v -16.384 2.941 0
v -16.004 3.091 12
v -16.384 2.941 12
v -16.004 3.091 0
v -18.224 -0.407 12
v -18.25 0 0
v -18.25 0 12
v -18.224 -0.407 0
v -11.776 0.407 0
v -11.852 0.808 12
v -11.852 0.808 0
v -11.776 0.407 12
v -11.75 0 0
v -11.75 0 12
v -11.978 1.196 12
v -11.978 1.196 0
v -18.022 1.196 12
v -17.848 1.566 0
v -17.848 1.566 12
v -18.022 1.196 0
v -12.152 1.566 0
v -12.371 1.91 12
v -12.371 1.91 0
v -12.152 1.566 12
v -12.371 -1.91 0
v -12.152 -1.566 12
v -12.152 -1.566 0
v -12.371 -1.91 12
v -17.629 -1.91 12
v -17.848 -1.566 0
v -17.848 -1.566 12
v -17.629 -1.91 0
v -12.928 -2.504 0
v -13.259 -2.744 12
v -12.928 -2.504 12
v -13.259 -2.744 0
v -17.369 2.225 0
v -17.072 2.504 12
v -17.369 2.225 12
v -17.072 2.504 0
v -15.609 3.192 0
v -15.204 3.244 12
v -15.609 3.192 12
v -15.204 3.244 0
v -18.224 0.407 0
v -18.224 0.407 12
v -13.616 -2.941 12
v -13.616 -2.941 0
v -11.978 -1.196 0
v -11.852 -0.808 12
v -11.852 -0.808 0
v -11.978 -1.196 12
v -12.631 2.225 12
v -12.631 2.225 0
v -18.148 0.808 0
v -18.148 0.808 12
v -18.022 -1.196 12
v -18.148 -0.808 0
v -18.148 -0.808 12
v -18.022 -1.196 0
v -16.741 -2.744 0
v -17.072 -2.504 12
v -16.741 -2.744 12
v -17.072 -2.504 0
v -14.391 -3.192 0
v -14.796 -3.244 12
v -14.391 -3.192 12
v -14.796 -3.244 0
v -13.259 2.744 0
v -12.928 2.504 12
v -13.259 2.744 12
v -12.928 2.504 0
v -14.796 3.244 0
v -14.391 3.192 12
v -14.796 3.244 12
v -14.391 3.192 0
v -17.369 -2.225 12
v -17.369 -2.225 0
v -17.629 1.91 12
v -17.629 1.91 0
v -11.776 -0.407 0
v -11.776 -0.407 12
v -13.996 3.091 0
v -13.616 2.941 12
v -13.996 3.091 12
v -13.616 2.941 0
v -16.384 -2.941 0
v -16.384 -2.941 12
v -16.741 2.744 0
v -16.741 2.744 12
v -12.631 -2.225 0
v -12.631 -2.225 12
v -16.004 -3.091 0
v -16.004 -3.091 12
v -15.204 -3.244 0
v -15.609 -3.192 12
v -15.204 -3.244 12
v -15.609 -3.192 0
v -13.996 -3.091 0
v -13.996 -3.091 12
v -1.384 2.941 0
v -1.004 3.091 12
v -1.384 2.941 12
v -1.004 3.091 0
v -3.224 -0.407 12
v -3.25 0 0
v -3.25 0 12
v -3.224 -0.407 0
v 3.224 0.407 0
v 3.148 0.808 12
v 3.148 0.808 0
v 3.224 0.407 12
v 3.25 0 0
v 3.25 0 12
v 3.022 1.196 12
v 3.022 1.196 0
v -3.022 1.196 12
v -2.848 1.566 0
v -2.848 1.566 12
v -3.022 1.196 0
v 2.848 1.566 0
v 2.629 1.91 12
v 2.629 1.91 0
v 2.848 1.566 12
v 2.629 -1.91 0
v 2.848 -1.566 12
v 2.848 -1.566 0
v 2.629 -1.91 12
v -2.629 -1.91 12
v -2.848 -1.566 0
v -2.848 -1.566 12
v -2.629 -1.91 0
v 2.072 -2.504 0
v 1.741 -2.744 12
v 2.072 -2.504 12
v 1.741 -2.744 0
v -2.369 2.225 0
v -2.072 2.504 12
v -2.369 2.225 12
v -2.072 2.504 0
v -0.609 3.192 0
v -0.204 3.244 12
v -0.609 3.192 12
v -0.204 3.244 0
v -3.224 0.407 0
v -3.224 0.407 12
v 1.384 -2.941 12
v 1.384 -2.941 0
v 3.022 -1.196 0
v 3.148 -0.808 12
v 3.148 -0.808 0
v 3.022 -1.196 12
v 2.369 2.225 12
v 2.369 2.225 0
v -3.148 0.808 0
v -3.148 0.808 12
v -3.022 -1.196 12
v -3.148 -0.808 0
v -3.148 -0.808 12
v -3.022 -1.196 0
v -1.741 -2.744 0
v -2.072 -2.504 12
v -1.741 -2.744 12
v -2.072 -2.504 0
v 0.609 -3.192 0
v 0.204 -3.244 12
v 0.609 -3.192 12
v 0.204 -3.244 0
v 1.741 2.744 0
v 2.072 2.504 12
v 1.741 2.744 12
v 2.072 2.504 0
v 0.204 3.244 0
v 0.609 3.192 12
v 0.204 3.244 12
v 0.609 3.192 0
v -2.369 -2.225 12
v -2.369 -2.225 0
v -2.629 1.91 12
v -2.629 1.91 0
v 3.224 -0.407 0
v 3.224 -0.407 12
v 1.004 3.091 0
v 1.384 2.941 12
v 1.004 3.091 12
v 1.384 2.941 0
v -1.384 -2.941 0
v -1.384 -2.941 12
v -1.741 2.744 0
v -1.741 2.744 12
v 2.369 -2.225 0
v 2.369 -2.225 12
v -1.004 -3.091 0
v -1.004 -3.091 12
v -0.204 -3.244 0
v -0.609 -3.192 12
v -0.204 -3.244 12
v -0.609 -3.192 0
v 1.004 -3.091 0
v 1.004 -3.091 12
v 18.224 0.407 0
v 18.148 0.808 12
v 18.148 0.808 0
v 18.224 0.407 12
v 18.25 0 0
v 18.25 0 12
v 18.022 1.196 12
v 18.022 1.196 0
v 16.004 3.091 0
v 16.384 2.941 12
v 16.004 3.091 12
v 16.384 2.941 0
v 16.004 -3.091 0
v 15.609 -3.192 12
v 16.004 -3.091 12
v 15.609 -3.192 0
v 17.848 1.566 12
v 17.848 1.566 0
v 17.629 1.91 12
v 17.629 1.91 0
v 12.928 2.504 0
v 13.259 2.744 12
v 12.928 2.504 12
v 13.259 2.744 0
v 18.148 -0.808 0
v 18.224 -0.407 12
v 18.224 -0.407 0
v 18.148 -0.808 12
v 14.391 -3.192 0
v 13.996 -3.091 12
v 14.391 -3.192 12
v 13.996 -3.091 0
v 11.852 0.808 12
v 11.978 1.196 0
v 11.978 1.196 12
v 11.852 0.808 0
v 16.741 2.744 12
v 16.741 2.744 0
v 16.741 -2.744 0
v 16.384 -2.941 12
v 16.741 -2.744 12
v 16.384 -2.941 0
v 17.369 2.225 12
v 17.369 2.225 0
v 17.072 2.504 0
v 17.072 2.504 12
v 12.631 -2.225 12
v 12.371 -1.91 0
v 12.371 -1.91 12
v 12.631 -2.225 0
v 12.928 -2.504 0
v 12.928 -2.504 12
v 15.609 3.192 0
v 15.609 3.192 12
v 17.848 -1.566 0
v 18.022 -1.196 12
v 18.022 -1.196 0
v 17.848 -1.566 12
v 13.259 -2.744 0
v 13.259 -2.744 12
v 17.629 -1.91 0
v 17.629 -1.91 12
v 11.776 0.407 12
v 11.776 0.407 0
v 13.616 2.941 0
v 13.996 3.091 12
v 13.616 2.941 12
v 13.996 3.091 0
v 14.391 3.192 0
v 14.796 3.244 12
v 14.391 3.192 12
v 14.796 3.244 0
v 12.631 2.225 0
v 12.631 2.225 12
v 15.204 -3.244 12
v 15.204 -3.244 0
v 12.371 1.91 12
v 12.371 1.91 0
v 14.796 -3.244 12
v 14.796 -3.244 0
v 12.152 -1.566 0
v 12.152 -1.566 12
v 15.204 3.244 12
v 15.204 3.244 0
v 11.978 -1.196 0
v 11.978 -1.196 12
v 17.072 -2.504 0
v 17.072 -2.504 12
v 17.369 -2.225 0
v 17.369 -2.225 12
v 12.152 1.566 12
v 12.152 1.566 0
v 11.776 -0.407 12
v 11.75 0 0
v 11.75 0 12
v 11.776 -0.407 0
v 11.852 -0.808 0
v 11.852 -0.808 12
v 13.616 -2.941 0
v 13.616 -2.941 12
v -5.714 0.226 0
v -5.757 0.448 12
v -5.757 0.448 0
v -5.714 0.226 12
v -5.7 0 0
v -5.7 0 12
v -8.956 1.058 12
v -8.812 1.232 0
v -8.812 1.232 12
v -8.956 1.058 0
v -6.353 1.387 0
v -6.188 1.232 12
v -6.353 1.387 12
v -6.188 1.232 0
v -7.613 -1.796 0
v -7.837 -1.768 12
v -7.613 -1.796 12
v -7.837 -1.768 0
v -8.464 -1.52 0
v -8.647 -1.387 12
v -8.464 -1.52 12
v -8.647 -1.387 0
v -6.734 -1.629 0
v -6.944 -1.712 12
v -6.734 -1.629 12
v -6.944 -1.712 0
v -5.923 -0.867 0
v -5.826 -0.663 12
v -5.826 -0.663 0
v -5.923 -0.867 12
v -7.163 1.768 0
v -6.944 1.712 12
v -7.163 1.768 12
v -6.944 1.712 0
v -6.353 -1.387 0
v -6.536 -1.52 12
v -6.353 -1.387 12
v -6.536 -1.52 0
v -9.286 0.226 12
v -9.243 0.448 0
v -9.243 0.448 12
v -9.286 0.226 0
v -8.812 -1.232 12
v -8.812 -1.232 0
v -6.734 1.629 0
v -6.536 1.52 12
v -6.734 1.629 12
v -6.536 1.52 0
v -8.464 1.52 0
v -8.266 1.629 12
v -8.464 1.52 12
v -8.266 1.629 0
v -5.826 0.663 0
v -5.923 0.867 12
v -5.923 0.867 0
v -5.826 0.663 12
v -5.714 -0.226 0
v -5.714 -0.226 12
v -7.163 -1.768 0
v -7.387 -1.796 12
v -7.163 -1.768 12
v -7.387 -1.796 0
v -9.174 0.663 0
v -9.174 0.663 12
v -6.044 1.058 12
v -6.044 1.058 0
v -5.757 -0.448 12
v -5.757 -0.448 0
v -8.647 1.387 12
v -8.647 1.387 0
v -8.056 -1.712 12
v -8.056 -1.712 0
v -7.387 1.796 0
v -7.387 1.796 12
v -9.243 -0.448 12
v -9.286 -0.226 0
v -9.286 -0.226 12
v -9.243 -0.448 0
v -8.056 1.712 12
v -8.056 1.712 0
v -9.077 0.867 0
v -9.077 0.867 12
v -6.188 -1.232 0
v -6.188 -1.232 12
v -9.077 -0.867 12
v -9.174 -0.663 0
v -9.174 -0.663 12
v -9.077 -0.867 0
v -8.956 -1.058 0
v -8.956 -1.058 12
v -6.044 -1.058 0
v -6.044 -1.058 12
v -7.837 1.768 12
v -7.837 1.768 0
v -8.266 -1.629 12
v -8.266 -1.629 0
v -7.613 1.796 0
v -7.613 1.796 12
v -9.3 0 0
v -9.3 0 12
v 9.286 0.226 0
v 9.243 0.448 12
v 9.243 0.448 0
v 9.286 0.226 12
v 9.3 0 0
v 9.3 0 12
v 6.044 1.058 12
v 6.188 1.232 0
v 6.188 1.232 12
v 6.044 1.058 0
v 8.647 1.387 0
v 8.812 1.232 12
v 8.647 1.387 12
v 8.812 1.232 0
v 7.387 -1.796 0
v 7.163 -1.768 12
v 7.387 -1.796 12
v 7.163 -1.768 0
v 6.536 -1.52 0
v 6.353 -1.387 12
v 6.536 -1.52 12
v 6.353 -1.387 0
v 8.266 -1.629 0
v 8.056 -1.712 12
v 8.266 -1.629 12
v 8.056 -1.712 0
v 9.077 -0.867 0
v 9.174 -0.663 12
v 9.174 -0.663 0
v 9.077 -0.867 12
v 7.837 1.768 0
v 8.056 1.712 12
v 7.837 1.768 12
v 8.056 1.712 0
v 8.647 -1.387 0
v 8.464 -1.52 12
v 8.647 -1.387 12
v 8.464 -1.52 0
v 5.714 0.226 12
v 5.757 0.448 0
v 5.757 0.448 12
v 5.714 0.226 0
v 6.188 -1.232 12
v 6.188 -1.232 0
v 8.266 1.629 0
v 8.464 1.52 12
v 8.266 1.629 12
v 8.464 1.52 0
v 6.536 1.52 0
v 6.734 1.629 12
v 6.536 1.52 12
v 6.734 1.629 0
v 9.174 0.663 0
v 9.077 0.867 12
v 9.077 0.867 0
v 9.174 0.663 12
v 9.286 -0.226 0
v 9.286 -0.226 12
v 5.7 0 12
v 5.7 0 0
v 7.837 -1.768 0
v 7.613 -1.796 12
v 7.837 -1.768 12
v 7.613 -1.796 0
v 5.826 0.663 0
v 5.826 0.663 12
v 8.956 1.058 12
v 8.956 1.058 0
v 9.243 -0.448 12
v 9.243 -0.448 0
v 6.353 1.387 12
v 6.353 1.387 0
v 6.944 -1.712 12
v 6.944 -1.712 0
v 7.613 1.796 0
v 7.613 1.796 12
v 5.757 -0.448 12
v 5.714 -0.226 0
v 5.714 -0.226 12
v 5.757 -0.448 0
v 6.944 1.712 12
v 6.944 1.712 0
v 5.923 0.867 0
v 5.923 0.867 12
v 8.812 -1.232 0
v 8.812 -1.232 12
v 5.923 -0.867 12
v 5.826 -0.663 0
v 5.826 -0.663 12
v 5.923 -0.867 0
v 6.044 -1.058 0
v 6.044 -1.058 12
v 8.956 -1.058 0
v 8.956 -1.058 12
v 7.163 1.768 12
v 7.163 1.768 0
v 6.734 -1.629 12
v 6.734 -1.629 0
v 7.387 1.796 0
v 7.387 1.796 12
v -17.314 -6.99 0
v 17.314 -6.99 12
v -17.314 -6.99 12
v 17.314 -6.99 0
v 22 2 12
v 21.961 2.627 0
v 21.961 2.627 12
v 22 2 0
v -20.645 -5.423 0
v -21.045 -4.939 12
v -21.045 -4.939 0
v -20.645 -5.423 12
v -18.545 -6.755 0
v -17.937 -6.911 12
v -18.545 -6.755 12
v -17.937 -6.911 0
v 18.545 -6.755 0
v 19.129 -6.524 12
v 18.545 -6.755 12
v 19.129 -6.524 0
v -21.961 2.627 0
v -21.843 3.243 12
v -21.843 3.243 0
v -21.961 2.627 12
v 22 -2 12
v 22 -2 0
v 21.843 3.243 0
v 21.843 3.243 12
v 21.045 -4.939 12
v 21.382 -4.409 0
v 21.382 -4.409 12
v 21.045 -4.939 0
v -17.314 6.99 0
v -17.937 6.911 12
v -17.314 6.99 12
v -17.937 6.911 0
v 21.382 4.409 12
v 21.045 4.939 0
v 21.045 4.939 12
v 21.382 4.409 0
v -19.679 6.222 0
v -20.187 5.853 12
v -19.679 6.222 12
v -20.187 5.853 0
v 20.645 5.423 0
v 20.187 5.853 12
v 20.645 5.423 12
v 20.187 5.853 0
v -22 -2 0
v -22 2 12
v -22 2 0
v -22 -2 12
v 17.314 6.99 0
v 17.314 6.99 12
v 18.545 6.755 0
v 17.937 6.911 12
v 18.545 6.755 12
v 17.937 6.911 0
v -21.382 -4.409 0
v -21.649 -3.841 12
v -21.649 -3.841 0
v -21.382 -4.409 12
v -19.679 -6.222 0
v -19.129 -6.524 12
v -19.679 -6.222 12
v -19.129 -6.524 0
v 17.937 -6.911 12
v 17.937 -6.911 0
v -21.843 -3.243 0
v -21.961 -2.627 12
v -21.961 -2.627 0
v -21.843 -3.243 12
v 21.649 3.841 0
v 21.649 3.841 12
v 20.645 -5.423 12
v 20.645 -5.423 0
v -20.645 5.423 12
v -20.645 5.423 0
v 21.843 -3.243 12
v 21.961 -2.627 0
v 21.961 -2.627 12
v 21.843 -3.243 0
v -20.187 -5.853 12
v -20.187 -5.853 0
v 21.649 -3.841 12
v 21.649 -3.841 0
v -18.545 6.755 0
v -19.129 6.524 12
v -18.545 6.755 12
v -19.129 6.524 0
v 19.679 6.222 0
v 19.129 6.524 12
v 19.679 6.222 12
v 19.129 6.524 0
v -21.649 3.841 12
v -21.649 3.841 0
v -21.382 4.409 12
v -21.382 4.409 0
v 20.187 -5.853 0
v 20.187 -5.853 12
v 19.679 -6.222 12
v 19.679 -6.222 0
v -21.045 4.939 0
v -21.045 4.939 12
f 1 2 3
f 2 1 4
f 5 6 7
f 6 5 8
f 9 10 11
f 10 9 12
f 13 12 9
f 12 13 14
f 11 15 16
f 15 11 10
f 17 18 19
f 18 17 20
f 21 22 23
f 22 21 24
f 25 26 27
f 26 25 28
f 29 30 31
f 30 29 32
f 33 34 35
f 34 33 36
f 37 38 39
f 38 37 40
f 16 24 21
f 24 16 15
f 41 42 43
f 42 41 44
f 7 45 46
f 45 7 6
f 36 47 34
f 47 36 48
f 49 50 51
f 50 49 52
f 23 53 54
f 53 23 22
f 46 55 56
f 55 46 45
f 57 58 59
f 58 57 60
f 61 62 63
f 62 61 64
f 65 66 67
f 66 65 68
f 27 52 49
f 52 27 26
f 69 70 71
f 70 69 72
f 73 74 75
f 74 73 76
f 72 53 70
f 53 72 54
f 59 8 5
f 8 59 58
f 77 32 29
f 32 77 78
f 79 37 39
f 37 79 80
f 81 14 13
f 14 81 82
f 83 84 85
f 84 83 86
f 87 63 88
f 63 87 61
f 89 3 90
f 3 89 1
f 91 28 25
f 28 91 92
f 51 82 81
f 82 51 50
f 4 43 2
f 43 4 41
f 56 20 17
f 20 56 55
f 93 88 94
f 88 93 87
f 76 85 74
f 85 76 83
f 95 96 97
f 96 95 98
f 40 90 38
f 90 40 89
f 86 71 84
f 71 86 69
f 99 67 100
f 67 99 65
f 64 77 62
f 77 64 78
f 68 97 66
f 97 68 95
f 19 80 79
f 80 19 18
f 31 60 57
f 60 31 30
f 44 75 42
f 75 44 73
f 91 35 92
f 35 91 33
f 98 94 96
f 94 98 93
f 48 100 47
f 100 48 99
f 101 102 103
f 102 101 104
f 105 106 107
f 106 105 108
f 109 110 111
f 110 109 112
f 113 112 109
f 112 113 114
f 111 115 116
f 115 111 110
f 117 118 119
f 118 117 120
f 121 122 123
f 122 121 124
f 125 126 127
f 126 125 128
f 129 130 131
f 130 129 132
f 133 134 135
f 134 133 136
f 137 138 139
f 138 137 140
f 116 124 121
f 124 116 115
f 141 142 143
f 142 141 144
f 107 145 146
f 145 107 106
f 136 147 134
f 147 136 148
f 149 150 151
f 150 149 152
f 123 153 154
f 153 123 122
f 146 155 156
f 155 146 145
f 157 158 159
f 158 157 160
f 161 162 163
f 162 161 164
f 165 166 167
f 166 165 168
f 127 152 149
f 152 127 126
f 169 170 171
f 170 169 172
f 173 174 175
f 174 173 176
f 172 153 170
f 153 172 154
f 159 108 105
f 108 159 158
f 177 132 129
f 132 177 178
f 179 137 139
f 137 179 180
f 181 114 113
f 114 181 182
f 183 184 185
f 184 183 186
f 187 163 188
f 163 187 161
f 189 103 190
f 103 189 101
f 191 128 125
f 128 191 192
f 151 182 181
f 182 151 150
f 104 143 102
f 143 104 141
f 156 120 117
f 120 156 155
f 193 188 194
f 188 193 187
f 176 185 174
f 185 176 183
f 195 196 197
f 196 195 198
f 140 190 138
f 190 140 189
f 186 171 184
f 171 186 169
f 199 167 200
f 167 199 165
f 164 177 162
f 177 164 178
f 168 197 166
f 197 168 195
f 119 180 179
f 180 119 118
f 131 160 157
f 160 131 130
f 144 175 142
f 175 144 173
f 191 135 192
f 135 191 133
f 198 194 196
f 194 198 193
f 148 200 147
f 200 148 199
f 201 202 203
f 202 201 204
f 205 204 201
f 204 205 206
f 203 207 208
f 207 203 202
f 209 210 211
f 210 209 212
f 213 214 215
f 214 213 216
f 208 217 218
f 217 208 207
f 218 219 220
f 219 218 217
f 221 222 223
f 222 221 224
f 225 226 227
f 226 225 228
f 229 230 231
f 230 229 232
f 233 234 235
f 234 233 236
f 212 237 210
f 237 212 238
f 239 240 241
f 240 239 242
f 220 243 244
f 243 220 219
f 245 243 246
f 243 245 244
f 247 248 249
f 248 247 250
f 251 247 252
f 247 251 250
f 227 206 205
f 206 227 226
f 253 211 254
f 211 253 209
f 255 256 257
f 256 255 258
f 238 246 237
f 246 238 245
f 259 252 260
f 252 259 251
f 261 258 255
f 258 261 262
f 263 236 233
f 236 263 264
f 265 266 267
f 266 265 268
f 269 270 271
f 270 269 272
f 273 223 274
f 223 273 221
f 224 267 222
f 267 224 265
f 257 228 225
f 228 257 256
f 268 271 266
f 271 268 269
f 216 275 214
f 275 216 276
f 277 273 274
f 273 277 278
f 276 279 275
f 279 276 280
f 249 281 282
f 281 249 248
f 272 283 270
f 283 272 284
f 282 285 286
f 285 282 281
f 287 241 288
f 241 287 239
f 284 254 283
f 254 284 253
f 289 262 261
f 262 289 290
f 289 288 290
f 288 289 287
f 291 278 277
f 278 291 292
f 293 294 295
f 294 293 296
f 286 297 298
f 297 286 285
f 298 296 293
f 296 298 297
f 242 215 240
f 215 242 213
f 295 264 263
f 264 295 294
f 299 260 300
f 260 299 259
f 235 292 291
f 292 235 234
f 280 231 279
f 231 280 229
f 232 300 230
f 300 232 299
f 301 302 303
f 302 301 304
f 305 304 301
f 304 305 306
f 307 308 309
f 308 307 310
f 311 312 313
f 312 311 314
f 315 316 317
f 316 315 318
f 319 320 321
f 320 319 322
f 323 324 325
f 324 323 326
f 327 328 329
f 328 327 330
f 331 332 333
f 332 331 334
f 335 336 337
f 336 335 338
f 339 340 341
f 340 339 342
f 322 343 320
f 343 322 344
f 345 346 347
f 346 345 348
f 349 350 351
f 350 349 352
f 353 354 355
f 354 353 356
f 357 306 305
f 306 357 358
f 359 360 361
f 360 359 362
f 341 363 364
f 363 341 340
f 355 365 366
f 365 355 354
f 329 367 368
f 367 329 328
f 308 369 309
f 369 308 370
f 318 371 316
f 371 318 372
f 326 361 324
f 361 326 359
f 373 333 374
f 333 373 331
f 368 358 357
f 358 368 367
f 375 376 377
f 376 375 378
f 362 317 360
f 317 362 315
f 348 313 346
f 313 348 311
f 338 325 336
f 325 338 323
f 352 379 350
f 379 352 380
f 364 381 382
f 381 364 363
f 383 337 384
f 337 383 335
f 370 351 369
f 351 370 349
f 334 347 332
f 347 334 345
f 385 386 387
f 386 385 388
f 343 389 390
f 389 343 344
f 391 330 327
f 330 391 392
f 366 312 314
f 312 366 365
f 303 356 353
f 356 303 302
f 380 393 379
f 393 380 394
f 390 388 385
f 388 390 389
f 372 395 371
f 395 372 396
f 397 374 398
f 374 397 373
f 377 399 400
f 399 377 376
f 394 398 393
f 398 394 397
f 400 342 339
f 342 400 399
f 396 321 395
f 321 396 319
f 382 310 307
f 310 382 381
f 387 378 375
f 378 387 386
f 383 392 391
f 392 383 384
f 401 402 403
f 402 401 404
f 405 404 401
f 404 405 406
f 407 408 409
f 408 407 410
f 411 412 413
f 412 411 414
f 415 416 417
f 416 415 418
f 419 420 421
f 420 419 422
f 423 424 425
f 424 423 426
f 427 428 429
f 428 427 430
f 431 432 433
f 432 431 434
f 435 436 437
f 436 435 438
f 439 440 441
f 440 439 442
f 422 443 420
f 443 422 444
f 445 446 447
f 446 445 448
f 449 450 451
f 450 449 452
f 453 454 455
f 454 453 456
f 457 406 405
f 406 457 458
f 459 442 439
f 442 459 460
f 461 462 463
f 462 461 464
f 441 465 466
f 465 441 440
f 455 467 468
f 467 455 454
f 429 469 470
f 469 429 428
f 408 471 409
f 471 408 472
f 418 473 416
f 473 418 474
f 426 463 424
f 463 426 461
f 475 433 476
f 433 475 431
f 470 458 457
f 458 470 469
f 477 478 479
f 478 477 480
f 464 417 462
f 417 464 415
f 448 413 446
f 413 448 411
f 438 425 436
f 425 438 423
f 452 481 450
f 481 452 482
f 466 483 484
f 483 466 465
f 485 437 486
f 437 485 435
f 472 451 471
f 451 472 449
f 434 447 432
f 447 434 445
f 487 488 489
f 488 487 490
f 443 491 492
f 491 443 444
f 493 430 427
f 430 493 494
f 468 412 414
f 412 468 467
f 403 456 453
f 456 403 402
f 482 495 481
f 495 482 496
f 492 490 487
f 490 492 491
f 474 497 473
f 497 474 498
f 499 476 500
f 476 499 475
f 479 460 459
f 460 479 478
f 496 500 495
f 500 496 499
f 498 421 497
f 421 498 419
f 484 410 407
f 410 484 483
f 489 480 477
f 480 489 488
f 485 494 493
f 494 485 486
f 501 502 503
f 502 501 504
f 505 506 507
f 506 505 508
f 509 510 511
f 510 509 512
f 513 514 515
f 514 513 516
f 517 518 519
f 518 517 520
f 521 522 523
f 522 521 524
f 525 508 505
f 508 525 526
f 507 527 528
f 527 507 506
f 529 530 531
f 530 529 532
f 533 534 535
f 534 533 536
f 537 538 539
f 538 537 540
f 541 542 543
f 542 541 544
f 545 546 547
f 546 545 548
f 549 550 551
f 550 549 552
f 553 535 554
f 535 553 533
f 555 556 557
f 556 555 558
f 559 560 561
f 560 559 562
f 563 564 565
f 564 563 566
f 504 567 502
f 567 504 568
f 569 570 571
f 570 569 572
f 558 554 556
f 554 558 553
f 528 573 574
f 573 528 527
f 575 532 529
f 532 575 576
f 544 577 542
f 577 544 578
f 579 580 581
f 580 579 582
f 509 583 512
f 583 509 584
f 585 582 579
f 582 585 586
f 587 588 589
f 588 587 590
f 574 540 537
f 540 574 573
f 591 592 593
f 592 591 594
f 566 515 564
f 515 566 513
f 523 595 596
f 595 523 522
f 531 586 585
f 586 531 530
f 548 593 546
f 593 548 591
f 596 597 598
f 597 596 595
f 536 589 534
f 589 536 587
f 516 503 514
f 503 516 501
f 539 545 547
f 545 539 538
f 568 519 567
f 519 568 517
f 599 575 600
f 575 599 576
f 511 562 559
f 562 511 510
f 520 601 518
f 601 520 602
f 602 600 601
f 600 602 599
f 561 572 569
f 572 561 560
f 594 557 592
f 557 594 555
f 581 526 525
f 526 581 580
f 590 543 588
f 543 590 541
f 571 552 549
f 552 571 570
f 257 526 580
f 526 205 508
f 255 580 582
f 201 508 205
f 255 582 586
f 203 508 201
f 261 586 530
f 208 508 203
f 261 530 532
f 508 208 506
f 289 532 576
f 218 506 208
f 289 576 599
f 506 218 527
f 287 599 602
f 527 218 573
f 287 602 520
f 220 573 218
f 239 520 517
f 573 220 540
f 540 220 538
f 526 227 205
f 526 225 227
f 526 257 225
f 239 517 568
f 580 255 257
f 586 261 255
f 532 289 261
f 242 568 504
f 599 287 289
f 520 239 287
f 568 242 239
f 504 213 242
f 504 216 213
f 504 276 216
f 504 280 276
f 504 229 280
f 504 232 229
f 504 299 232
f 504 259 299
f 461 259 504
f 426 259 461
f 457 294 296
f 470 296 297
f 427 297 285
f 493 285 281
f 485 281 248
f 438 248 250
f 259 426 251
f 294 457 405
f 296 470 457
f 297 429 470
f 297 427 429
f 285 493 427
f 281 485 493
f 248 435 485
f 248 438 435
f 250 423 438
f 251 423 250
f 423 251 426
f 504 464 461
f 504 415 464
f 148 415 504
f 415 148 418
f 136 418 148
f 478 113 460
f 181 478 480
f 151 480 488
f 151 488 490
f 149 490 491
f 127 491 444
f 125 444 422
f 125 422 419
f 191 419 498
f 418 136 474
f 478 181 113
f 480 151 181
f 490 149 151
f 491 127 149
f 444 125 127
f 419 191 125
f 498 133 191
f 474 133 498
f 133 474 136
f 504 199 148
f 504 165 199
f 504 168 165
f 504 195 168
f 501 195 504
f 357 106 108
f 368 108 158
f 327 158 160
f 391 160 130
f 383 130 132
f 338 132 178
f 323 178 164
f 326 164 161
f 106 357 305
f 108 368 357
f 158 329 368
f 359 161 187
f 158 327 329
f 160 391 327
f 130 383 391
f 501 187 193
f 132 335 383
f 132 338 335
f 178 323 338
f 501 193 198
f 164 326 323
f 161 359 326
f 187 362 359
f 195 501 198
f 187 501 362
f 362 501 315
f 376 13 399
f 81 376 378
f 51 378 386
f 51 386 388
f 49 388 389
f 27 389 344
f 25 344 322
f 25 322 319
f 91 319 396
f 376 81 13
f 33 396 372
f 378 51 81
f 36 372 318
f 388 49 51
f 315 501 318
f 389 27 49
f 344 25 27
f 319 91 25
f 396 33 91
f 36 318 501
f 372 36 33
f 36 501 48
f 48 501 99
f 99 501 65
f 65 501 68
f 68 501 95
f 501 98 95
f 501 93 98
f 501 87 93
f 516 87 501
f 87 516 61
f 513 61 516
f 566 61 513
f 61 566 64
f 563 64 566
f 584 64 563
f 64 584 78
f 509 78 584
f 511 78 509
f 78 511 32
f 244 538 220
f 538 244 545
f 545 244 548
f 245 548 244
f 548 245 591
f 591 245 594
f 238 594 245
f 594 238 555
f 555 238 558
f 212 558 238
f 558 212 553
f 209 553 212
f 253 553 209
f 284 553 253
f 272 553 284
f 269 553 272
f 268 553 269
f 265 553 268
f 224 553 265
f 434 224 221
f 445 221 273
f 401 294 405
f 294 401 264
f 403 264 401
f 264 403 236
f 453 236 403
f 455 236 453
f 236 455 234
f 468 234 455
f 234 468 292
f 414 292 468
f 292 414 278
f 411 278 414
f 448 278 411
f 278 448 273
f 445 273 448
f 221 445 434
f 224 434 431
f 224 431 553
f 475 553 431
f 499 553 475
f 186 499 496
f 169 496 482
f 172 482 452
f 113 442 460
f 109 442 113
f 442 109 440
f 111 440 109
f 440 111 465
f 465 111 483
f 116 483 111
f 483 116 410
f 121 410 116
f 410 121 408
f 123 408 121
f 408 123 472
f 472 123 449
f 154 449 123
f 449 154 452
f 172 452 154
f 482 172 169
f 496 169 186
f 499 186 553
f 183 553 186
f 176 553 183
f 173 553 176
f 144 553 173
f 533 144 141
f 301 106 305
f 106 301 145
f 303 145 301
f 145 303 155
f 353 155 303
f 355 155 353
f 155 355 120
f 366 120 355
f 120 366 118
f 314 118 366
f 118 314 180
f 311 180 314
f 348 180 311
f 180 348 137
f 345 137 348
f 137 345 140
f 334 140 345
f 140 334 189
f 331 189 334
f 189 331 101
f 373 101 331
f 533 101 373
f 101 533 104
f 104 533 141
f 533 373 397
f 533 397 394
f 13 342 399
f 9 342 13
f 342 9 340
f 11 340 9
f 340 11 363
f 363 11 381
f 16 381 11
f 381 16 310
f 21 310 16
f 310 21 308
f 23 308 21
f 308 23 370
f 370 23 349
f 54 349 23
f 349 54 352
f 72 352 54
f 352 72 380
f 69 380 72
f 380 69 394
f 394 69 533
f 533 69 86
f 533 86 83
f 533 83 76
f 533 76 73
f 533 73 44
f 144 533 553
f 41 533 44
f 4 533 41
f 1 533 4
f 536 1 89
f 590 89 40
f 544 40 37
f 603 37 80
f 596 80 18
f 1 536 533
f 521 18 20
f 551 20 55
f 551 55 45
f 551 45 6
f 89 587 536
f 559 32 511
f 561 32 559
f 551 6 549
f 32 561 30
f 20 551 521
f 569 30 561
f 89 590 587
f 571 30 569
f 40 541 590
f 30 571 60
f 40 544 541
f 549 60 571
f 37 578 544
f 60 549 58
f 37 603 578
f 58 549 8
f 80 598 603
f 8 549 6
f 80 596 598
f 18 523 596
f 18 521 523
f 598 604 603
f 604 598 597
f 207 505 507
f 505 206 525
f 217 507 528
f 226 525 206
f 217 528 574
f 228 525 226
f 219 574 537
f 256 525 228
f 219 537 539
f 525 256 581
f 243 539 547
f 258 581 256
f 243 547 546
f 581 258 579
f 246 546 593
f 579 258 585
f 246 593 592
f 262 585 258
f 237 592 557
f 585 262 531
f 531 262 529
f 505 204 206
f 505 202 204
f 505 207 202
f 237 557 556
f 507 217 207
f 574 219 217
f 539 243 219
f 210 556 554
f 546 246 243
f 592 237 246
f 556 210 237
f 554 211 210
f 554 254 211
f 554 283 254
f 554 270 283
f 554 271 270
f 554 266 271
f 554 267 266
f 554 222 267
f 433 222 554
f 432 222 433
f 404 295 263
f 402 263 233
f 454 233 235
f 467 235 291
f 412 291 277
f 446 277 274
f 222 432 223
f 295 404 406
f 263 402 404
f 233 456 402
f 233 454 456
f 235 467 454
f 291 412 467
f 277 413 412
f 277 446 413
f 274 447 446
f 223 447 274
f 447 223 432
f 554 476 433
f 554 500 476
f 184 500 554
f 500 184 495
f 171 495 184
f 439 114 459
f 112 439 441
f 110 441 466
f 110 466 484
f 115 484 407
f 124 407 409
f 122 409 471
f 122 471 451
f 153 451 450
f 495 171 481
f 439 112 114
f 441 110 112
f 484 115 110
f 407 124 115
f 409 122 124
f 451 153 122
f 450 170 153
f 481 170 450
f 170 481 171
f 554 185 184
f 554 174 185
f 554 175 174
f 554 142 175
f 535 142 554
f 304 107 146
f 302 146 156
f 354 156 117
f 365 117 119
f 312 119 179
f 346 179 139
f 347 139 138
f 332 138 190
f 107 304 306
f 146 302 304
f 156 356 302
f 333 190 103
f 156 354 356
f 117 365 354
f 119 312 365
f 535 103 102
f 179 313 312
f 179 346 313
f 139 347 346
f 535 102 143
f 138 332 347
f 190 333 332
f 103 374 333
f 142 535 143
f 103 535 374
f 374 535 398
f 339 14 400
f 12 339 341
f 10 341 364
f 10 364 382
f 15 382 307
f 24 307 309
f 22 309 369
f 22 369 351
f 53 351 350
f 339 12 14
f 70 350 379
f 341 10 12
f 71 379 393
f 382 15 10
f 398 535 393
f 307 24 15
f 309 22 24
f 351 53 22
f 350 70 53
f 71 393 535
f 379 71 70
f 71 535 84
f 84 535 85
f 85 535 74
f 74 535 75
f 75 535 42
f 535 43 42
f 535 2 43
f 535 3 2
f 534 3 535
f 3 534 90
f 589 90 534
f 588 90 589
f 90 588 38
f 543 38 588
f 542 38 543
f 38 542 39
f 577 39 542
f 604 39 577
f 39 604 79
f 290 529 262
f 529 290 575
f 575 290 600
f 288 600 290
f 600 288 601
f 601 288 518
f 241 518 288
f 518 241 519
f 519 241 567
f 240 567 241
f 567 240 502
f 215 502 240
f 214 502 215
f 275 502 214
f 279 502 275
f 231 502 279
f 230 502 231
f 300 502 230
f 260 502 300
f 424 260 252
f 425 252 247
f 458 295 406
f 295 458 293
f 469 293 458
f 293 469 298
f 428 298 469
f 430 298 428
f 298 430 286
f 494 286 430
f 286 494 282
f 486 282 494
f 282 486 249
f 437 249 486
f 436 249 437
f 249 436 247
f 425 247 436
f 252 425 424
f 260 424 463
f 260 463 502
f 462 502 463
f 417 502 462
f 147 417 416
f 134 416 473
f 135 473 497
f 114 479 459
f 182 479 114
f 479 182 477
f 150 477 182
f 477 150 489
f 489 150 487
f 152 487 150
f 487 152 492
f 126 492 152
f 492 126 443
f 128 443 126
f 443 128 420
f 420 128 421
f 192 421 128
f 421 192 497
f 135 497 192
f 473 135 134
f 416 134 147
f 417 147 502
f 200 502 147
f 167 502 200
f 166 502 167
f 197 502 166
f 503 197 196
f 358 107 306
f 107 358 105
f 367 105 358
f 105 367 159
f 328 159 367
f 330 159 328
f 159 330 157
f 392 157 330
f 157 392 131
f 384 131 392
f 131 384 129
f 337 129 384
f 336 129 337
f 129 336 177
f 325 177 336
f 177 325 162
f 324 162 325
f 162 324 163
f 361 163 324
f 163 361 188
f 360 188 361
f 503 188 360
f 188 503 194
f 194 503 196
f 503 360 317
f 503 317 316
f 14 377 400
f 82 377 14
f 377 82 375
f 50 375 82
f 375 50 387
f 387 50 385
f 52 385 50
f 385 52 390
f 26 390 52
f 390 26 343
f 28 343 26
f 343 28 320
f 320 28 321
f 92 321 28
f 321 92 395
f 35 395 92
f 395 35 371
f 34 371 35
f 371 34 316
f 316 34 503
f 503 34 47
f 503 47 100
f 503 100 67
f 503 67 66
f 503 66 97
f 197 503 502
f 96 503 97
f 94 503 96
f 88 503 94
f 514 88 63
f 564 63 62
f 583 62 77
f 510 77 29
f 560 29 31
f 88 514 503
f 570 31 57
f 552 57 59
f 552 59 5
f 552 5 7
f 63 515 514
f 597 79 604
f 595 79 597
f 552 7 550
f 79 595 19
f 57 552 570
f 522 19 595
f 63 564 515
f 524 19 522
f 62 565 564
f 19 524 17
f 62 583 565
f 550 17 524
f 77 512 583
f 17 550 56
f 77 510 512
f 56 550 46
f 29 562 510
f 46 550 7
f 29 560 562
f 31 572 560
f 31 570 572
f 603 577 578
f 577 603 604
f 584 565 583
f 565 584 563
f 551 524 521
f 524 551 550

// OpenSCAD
$fn = 50;


difference() {
	union() {
		*color(alpha = 1.0000000000, c = "gray") {
			translate(v = [0, 7, 0]) {
				linear_extrude(height = 1) {
					text(font = "Arial:style=Bold", halign = "center", size = 4.5000000000, text = "COMMENT plate main", valign = "center");
				}
			}
		}
		hull() {
			translate(v = [-17.0000000000, 2.0000000000, 0]) {
				cylinder(h = 12, r = 5);
			}
			translate(v = [17.0000000000, 2.0000000000, 0]) {
				cylinder(h = 12, r = 5);
			}
			translate(v = [-17.0000000000, -2.0000000000, 0]) {
				cylinder(h = 12, r = 5);
			}
			translate(v = [17.0000000000, -2.0000000000, 0]) {
				cylinder(h = 12, r = 5);
			}
		}
	}
	union() {
		*color(alpha = 1.0000000000, c = "gray") {
			translate(v = [0, 7, 0]) {
				linear_extrude(height = 1) {
					text(font = "Arial:style=Bold", halign = "center", size = 4.5000000000, text = "COMMENT holes main", valign = "center");
				}
			}
		}
		translate(v = [-15.0000000000, 0.0000000000, 0]) {
			translate(v = [0, 0, -100]) {
				cylinder(h = 200, r = 3.2500000000);
			}
		}
		translate(v = [0, 0, -100]) {
			cylinder(h = 200, r = 3.2500000000);
		}
		translate(v = [15.0000000000, 0.0000000000, 0]) {
			translate(v = [0, 0, -100]) {
				cylinder(h = 200, r = 3.2500000000);
			}
		}
		translate(v = [-15.0000000000, 0.0000000000, 0]) {
			translate(v = [0, 0, -100]) {
				cylinder(h = 200, r = 1.8000000000);
			}
		}
		translate(v = [-7.5000000000, 0.0000000000, 0]) {
			translate(v = [0, 0, -100]) {
				cylinder(h = 200, r = 1.8000000000);
			}
		}
		translate(v = [0, 0, -100]) {
			cylinder(h = 200, r = 1.8000000000);
		}
		translate(v = [7.5000000000, 0.0000000000, 0]) {
			translate(v = [0, 0, -100]) {
				cylinder(h = 200, r = 1.8000000000);
			}
		}
		translate(v = [15.0000000000, 0.0000000000, 0]) {
			translate(v = [0, 0, -100]) {
				cylinder(h = 200, r = 1.8000000000);
			}
		}
	}
}
